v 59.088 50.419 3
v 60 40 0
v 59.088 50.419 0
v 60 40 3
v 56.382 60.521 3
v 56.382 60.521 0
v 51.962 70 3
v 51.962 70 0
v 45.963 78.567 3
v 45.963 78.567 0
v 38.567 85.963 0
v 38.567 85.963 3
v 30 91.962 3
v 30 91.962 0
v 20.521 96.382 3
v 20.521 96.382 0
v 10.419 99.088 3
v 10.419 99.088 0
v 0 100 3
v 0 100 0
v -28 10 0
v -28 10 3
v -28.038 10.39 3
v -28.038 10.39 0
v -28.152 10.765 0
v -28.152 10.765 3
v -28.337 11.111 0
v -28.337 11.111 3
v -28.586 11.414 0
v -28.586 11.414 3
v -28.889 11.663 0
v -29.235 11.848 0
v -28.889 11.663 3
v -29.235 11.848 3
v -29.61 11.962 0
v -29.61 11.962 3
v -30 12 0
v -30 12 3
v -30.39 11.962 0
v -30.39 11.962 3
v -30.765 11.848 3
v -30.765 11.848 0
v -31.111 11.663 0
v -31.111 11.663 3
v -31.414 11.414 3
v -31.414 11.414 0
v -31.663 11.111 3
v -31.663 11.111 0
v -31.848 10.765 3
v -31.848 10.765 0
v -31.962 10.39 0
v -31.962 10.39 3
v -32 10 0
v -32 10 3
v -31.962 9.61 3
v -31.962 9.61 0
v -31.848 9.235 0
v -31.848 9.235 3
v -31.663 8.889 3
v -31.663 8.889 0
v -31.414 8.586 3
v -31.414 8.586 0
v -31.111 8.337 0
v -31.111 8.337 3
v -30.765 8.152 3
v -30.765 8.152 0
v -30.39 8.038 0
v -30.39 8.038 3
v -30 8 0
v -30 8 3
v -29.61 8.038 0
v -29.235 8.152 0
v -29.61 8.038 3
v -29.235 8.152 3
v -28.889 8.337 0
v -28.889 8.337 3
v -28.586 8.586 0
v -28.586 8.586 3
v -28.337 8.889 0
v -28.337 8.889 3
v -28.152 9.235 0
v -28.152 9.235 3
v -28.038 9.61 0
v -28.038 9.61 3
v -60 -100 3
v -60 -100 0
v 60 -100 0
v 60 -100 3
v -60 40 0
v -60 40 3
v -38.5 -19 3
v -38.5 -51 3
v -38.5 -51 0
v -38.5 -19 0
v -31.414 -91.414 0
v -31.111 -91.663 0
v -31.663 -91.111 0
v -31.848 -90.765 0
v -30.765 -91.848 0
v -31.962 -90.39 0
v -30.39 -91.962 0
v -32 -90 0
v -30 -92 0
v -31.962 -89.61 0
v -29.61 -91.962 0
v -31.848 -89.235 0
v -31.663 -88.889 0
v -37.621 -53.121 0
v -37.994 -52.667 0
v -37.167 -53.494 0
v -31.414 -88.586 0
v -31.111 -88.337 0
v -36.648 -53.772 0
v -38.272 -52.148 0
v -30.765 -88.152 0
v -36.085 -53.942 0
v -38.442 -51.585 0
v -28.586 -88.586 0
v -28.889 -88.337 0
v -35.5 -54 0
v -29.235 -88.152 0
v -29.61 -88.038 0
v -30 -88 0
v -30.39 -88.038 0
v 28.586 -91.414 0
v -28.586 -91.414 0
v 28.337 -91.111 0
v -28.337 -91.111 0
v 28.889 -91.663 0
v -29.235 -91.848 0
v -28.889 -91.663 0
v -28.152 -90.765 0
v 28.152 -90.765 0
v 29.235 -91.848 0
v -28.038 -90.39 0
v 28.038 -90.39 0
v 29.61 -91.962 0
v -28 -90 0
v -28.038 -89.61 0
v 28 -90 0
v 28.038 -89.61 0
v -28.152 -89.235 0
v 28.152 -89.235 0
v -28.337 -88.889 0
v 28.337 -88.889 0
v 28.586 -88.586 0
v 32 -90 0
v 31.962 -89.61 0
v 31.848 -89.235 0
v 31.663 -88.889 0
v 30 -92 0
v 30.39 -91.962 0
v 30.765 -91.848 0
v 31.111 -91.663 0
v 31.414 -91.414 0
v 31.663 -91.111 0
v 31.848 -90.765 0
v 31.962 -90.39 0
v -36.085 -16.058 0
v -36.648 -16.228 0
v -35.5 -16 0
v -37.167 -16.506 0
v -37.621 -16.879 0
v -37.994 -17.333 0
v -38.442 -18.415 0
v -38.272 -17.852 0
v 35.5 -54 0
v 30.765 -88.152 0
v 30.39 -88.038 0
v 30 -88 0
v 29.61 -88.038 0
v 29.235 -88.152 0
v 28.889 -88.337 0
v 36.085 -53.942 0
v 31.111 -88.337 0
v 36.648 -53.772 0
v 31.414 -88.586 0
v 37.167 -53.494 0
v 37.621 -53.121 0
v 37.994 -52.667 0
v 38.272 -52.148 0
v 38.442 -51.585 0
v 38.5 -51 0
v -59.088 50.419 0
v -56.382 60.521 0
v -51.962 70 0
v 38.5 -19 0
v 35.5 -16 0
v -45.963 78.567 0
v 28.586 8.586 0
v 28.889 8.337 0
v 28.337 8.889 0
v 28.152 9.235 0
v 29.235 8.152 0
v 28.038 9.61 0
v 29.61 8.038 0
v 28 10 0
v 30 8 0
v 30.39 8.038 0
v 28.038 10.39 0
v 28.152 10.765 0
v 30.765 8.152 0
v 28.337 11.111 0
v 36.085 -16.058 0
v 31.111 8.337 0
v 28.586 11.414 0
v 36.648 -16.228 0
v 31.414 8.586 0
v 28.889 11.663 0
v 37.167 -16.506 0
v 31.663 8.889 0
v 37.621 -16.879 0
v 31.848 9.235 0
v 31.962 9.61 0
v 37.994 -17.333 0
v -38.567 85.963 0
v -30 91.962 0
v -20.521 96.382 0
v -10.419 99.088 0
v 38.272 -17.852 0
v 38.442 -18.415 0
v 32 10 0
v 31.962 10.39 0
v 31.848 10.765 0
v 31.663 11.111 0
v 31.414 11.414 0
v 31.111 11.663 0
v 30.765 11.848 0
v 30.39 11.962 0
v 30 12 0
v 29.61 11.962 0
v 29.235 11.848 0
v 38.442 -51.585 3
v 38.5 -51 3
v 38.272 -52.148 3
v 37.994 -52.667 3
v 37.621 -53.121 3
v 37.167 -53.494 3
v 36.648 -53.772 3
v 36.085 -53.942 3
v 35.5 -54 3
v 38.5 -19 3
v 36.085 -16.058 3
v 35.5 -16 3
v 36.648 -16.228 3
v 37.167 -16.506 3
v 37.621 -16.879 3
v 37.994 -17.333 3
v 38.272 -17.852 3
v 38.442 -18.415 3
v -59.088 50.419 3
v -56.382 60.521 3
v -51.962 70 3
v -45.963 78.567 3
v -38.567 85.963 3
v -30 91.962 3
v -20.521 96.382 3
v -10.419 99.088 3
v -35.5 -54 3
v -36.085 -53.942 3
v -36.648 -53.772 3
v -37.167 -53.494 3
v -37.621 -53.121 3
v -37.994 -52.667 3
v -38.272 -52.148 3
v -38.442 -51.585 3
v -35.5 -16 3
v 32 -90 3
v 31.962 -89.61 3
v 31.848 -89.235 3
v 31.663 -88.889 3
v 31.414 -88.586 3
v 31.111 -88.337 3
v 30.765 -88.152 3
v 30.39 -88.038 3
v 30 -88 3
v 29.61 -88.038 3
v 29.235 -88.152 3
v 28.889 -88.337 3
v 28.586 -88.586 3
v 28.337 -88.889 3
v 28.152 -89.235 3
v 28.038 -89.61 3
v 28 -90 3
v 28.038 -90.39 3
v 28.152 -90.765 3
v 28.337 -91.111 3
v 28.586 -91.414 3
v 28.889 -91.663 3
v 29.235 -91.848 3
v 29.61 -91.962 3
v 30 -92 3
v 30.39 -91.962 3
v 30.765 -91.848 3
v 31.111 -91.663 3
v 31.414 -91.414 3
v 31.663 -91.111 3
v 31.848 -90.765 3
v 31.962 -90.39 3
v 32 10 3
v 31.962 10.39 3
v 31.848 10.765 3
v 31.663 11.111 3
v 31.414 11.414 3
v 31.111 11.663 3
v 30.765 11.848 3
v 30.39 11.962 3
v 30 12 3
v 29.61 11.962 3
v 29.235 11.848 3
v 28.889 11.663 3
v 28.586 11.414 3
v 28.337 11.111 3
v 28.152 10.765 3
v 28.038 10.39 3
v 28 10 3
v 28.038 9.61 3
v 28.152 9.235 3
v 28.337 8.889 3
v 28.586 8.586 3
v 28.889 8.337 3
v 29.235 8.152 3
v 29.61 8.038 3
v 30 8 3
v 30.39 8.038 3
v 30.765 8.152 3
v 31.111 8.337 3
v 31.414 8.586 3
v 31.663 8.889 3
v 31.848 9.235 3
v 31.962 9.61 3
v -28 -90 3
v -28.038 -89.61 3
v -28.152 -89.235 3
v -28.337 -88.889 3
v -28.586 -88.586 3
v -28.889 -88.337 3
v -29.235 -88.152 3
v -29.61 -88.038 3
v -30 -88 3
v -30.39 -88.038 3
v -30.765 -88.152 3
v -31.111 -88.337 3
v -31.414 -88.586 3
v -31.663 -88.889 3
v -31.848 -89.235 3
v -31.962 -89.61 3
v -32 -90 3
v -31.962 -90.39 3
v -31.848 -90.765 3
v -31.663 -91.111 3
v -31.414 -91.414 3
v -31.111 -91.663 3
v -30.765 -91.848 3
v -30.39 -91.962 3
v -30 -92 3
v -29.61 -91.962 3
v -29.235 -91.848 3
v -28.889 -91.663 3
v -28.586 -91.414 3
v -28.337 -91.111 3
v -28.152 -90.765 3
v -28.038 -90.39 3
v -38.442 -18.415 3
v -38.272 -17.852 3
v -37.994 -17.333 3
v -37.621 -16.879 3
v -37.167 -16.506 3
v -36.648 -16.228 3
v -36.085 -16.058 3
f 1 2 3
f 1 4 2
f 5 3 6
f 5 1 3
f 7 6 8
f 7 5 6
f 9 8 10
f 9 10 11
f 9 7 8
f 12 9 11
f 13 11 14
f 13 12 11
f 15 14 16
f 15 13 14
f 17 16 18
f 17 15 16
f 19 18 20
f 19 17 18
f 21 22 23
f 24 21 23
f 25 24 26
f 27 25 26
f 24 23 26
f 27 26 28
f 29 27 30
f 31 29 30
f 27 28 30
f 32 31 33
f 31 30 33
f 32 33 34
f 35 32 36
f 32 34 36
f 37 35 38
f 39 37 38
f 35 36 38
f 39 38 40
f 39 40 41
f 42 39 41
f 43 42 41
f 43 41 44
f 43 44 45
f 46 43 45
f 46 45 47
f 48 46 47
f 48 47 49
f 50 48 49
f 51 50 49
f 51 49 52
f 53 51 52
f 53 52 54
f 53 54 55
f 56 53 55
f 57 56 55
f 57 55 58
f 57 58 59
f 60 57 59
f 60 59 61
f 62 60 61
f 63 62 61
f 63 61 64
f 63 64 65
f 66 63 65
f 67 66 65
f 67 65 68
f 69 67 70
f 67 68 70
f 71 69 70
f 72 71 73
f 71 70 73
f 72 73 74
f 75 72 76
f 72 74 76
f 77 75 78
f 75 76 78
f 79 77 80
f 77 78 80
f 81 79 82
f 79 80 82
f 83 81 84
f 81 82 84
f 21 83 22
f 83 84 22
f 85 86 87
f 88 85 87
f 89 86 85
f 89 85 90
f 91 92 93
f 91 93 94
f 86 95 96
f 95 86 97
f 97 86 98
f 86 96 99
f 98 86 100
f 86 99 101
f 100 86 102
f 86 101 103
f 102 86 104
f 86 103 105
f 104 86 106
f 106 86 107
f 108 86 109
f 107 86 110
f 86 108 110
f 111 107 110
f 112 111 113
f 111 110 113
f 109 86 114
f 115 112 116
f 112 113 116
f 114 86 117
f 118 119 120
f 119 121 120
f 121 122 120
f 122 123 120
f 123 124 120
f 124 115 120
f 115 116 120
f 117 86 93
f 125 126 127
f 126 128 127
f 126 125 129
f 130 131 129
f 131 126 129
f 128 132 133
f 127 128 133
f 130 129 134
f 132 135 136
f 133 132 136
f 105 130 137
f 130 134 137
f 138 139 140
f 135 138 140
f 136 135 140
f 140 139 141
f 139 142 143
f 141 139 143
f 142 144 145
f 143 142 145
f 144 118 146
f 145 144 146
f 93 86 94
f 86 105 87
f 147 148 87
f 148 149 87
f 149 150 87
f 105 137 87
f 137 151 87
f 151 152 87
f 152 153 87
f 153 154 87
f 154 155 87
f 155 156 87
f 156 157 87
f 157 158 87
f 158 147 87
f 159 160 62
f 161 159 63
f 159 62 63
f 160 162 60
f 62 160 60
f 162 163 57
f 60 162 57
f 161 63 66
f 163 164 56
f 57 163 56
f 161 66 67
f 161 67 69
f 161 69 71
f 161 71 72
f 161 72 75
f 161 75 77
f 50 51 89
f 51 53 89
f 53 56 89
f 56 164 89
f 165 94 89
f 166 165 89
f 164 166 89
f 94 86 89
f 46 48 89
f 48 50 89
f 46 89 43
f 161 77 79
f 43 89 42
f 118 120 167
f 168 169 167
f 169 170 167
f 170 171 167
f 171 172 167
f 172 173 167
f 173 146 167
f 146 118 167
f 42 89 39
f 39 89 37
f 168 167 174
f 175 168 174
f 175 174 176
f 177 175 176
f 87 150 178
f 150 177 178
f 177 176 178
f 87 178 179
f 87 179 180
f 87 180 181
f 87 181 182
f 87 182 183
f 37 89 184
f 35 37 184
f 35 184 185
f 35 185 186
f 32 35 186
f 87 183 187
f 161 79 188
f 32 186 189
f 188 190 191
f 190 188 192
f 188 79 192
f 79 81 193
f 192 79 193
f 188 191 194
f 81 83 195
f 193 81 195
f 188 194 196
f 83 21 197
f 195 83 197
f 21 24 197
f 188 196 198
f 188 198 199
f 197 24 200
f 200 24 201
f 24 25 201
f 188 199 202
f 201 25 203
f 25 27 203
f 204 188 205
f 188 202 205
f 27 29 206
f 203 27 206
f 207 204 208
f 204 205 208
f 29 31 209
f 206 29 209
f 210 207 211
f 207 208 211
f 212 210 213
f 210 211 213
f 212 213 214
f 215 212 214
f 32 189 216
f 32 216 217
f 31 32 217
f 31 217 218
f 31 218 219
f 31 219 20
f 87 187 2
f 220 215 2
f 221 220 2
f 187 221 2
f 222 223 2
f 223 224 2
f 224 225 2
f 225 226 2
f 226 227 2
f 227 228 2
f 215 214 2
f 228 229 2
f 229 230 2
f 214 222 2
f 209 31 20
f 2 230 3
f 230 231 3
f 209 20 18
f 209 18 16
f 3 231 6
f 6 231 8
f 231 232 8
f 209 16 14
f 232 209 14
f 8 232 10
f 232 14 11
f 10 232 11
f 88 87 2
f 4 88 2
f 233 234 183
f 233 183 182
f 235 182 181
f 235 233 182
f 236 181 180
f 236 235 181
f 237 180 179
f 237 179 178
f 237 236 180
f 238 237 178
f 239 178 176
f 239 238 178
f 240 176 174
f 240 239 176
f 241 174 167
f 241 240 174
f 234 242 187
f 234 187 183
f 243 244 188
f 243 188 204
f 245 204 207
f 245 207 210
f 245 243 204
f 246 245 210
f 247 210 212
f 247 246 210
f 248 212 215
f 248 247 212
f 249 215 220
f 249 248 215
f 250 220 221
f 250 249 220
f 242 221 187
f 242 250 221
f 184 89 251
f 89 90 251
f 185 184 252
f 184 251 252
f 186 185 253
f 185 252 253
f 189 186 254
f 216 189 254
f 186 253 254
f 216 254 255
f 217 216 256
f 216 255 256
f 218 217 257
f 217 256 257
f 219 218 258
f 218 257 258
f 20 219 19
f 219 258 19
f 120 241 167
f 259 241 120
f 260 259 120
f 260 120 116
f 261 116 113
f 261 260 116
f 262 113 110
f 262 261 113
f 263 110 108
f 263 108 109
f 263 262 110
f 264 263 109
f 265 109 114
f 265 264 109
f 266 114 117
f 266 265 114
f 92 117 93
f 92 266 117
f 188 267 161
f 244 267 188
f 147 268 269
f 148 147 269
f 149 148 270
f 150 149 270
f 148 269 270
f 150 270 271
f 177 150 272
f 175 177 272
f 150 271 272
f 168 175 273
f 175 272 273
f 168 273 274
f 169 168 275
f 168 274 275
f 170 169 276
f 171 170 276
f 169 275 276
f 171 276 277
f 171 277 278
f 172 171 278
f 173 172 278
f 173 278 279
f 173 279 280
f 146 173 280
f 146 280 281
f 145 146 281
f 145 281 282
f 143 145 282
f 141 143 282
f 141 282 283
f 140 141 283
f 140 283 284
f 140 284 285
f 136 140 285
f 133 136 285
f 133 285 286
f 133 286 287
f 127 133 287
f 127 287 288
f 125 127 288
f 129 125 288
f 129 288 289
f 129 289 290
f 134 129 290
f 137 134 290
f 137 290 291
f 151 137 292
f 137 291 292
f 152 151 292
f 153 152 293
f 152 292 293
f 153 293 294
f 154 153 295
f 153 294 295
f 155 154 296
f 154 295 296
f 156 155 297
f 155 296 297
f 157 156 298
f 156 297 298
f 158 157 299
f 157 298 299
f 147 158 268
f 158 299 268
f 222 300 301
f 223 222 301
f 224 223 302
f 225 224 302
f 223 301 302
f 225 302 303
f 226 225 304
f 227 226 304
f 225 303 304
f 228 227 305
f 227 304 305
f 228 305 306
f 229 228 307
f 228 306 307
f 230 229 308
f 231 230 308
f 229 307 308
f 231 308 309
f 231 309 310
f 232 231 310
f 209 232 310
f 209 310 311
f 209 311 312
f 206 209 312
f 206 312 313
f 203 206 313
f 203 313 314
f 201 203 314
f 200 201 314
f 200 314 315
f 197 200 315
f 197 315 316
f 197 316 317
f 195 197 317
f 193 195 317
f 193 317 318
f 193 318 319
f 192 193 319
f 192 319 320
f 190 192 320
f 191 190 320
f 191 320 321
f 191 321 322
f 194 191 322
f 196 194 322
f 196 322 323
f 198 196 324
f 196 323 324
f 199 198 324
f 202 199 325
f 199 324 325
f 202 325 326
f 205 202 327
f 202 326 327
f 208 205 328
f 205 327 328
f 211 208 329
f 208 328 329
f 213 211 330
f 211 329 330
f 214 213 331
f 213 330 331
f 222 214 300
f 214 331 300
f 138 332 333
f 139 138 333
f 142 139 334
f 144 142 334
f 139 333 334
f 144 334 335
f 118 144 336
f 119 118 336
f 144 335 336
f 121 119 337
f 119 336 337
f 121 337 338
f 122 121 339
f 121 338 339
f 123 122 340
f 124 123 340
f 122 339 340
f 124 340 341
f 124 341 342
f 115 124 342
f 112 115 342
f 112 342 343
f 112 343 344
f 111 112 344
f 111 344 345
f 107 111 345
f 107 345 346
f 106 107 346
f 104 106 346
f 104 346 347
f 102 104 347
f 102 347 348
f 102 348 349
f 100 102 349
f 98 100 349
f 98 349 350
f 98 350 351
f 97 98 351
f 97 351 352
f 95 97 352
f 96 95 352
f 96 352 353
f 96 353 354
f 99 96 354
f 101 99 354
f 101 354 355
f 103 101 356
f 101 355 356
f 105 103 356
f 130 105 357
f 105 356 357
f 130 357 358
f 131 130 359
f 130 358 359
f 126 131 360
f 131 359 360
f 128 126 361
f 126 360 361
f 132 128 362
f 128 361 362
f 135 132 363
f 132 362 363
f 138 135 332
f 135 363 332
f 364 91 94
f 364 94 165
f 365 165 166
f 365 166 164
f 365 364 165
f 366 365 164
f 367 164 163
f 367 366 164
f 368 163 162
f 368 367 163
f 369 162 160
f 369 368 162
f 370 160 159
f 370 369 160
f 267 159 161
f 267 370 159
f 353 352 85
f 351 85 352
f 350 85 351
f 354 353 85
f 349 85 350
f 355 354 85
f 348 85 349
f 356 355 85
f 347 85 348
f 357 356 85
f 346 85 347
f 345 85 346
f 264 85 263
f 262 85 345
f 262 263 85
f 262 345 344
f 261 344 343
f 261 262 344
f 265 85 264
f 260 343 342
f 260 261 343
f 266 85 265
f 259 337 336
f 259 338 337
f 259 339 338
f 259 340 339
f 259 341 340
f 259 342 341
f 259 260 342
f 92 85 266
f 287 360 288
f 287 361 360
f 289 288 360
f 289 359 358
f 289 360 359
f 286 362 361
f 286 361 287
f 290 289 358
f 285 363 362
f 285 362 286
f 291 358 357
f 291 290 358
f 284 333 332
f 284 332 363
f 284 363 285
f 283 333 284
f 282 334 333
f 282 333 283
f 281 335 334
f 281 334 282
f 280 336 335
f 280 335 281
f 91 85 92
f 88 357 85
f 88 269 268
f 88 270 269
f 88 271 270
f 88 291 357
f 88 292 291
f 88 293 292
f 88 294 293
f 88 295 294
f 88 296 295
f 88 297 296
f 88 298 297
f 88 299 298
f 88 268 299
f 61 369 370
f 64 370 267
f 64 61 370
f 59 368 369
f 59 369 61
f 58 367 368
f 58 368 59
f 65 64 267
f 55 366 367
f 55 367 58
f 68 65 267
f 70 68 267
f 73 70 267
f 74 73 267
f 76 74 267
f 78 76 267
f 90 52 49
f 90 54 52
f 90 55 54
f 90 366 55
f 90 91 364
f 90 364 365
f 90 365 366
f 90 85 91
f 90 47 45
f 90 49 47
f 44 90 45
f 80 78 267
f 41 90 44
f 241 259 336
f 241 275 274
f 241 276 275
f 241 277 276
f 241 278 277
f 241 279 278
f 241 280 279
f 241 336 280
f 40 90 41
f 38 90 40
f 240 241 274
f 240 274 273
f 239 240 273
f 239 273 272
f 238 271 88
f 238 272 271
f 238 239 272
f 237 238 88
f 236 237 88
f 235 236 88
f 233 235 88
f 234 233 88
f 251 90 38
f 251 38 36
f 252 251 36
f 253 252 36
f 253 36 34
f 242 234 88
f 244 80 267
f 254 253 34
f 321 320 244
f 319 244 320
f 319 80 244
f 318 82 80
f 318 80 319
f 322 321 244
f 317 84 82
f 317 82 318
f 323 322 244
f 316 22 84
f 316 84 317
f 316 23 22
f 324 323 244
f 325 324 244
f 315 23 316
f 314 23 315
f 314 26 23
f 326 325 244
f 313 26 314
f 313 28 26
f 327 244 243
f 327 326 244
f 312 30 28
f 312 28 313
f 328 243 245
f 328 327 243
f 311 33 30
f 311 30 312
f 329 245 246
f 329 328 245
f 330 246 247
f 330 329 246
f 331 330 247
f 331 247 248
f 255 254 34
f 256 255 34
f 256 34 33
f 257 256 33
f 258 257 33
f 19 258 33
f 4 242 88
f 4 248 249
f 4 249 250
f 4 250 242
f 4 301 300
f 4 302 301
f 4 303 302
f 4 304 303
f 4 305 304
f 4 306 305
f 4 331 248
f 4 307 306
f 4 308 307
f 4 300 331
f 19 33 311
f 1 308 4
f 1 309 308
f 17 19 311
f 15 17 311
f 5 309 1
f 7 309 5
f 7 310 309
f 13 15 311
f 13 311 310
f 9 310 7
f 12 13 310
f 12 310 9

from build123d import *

# Parameters (mm, degrees)
SKETCH1_W           = 120
SKETCH1_H           = 200
BOSS_EXTRUDE1_DEPTH = 3
FILLET1_R           = 60
CUT_EXTRUDE1_DEPTH  = 3
SKETCH3_R           = 2
CUT_EXTRUDE2_DEPTH  = 10


with BuildPart() as part:
    # Sketch1 → Boss-Extrude1 (new body)
    with BuildSketch(Plane.XY):
        Rectangle(SKETCH1_W, SKETCH1_H)
    extrude(amount=BOSS_EXTRUDE1_DEPTH)

    # Fillet1
    fillet1_edges = [part.edges().sort_by_distance(p)[0] for p in [
        (60, 100, 1.5),
        (-60, 100, 1.5),
    ]]
    fillet(fillet1_edges, radius=FILLET1_R - 0.0001)  # a hair under: the kernel refuses the full size

    # Sketch2 → Cut-Extrude1 (cut)
    with BuildSketch(Plane.XY.offset(3)):
        with BuildLine():
            Line((-35.5, -16), (35.5, -16))
            ThreePointArc((35.5, -16), (37.621320344, -16.878679656), (38.5, -19))
            Line((38.5, -19), (38.5, -51))
            ThreePointArc((38.5, -51), (37.621320344, -53.121320344), (35.5, -54))
            Line((35.5, -54), (-35.5, -54))
            ThreePointArc((-35.5, -54), (-37.621320344, -53.121320344), (-38.5, -51))
            Line((-38.5, -51), (-38.5, -19))
            ThreePointArc((-38.5, -19), (-37.621320344, -16.878679656), (-35.5, -16))
        make_face()
    extrude(amount=-CUT_EXTRUDE1_DEPTH, mode=Mode.SUBTRACT)

    # Sketch3 → Cut-Extrude2 (cut)
    with BuildSketch(Plane.XY.offset(3)):
        with Locations((-30, -90)):
            Circle(SKETCH3_R)
        with Locations((-30, 10)):
            Circle(SKETCH3_R)
        with Locations((30, 10)):
            Circle(SKETCH3_R)
        with Locations((30, -90)):
            Circle(SKETCH3_R)
    extrude(amount=-CUT_EXTRUDE2_DEPTH, mode=Mode.SUBTRACT)


solid = part.part
